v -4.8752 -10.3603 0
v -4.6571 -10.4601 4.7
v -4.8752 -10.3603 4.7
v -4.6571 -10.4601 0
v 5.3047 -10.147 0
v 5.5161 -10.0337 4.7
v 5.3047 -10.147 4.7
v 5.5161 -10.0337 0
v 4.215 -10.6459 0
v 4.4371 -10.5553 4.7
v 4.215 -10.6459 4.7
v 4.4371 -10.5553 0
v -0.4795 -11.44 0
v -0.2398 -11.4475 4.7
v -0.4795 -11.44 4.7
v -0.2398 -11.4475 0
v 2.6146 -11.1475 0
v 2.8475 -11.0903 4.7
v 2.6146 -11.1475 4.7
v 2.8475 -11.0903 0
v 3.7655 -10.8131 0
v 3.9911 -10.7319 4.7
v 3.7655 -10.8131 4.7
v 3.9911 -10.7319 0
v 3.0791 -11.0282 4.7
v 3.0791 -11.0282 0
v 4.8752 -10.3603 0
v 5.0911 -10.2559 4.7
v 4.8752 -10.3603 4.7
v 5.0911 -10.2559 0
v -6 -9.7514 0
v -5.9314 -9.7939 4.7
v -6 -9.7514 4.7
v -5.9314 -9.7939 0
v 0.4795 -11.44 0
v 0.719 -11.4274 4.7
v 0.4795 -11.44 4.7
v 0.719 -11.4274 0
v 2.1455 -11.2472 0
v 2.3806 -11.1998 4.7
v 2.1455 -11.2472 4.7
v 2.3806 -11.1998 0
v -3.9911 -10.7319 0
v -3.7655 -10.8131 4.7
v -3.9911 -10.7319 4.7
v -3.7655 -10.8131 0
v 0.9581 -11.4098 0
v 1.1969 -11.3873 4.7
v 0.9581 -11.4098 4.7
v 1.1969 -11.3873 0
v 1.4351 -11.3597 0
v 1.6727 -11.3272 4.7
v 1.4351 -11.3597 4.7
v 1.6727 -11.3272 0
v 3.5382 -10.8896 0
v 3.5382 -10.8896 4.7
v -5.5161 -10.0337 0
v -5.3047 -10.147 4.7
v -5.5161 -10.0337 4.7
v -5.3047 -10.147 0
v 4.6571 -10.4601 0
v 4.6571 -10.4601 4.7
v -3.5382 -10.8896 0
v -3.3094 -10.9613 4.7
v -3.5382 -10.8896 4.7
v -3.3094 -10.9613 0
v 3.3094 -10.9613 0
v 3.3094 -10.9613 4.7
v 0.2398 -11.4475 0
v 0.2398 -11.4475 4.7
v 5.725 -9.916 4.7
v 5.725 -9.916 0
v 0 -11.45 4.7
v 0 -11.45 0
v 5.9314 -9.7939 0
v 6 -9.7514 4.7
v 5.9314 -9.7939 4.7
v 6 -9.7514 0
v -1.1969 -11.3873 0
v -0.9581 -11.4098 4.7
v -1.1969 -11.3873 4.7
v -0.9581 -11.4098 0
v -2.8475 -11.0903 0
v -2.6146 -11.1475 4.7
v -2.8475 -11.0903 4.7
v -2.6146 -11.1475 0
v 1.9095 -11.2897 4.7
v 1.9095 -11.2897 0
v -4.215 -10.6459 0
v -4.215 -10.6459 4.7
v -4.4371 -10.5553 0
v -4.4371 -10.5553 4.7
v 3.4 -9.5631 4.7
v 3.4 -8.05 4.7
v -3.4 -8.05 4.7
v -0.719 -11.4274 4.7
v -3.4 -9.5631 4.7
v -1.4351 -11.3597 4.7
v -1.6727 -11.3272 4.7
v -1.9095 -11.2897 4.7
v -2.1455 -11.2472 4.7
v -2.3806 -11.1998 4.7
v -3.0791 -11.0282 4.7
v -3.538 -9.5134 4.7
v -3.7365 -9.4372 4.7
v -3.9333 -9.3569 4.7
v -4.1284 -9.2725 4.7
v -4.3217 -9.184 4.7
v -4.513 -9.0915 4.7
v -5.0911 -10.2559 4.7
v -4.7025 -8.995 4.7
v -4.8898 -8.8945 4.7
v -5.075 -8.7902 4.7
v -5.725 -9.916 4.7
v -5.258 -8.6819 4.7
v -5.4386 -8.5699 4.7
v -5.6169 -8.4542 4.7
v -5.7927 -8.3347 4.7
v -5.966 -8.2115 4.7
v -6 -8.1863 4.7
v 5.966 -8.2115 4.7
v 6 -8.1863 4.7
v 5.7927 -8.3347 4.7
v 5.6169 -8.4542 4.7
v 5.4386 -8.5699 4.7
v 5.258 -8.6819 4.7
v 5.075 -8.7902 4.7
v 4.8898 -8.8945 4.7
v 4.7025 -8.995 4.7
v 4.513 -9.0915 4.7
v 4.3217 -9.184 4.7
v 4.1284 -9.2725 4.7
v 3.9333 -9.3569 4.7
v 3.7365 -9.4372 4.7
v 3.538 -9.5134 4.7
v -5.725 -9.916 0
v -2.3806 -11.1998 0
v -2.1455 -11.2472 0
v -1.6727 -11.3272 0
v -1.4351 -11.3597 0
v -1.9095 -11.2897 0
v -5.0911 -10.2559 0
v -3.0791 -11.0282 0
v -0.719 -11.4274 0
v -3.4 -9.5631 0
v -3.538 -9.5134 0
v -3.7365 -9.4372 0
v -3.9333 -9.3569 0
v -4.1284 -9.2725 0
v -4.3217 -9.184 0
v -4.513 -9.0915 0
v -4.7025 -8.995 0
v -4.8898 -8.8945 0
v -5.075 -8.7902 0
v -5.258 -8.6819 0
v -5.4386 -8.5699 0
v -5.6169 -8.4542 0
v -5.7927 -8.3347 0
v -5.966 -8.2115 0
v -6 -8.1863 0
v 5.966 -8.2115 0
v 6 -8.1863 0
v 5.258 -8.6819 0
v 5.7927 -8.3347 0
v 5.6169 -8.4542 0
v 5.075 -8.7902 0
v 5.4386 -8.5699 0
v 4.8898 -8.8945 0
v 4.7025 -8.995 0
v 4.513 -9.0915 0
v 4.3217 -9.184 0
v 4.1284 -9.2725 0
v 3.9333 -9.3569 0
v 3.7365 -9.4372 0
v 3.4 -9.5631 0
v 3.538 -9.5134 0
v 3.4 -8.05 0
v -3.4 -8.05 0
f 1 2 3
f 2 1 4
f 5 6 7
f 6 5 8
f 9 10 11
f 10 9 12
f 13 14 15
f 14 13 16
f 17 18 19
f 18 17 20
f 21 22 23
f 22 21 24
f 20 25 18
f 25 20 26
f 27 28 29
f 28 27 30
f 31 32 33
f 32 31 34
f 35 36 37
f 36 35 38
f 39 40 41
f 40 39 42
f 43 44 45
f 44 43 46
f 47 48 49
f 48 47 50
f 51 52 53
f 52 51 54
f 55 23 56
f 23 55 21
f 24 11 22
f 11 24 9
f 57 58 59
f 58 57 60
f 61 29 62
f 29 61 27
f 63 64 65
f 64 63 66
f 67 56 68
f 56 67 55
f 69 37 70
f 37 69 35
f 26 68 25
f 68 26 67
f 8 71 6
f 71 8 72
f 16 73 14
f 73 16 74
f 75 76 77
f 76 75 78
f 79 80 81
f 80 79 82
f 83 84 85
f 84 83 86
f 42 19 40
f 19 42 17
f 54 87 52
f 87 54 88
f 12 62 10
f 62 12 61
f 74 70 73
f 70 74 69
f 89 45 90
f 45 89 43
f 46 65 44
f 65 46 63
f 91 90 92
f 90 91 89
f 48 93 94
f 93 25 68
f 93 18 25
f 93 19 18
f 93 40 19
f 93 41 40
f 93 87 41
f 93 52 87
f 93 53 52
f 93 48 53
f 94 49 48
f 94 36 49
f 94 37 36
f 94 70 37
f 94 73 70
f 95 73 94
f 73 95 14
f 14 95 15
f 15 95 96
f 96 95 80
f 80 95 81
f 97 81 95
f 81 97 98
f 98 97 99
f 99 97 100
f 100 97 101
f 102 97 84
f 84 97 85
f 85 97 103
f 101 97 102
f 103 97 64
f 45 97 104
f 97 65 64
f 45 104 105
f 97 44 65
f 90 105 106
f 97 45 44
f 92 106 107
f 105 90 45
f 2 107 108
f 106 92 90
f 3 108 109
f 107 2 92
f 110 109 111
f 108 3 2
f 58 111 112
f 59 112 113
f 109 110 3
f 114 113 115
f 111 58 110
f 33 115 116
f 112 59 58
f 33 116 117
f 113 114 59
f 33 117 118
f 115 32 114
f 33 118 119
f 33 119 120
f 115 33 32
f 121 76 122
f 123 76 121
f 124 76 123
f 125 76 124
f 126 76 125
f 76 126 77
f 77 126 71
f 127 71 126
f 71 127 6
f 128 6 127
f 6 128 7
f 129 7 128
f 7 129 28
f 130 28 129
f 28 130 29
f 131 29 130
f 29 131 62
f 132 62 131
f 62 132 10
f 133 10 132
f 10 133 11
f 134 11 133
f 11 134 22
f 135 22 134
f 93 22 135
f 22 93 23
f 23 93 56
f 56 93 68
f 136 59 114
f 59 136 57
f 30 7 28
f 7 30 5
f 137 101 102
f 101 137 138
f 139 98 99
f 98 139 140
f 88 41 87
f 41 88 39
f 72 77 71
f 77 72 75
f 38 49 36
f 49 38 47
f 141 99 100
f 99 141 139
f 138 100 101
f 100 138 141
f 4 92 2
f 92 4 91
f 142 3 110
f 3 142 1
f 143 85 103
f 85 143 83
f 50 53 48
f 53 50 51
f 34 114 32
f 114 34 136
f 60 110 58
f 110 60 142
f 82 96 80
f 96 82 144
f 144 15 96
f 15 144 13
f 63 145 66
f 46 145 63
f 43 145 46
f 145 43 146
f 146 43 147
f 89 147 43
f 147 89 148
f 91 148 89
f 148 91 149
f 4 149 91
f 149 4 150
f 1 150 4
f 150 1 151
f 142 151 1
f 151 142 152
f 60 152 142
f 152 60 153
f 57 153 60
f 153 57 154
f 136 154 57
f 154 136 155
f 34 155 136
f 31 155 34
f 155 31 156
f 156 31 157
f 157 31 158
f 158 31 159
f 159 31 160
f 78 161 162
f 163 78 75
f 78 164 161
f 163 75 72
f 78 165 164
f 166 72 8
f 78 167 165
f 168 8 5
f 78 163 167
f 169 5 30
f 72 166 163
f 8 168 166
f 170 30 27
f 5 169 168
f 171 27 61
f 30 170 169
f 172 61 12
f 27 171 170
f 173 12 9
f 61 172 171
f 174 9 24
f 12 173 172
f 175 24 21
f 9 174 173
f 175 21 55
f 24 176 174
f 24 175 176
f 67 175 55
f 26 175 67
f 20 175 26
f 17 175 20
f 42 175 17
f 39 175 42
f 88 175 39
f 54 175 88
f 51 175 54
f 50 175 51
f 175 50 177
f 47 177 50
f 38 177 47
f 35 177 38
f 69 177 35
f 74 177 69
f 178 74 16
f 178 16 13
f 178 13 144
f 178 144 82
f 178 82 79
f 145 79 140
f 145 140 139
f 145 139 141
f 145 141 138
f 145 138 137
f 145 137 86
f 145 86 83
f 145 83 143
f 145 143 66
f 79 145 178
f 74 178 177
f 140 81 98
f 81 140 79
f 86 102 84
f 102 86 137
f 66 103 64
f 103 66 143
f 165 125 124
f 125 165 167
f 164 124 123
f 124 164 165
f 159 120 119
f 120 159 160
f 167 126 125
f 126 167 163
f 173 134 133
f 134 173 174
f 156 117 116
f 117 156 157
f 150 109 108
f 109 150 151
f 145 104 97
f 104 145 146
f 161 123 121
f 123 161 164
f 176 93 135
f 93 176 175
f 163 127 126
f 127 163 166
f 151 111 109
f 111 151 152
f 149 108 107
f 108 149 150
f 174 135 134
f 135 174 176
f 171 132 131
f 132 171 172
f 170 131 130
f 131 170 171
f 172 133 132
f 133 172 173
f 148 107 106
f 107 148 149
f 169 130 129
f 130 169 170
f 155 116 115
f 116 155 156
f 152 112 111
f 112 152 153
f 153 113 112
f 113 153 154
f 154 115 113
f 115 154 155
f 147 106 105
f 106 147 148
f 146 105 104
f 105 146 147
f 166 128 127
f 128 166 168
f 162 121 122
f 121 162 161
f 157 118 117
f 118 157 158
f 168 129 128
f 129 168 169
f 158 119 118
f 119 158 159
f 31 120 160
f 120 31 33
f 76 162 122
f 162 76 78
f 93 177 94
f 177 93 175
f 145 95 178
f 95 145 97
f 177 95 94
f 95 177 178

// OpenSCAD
// file: candlestick-dimensions.scad
// BSD-3-Clause License
//
// Copyright 2025 Kit Fitzpatrick
//
// Redistribution and use in source and binary forms, with or without modification, are
// permitted provided that the following conditions are met:
//
// 1. Redistributions of source code must retain the above copyright notice, this list of
//    conditions and the following disclaimer.
//
// 2. Redistributions in binary form must reproduce the above copyright notice, this list
//    of conditions and the following disclaimer in the documentation and/or other
//    materials provided with the distribution.
//
// 3. Neither the name of the copyright holder nor the names of its contributors may be
//    used to endorse or promote products derived from this software without specific
//    prior written permission.
//
// THIS SOFTWARE IS PROVIDED BY THE COPYRIGHT HOLDERS AND CONTRIBUTORS “AS IS” AND ANY
// EXPRESS OR IMPLIED WARRANTIES, INCLUDING, BUT NOT LIMITED TO, THE IMPLIED WARRANTIES
// OF MERCHANTABILITY AND FITNESS FOR A PARTICULAR PURPOSE ARE DISCLAIMED. IN NO EVENT
// SHALL THE COPYRIGHT HOLDER OR CONTRIBUTORS BE LIABLE FOR ANY DIRECT, INDIRECT,
// INCIDENTAL, SPECIAL, EXEMPLARY, OR CONSEQUENTIAL DAMAGES (INCLUDING, BUT NOT LIMITED
// TO, PROCUREMENT OF SUBSTITUTE GOODS OR SERVICES; LOSS OF USE, DATA, OR PROFITS; OR
// BUSINESS INTERRUPTION) HOWEVER CAUSED AND ON ANY THEORY OF LIABILITY, WHETHER IN
// CONTRACT, STRICT LIABILITY, OR TORT (INCLUDING NEGLIGENCE OR OTHERWISE) ARISING IN ANY
// WAY OUT OF THE USE OF THIS SOFTWARE, EVEN IF ADVISED OF THE POSSIBILITY OF SUCH DAMAGE.

//
// This is the project file containing the dimensional parameters so they can be shared
// between models.
//
// -- Part of the antique candlestick holder project
//

candle_od = 22.9; // Standard candle size, plus just a bit
candle_height = 120;

// Actually half the thickness for the candle body,
// it's the difference of the diameters. Other use is
// actual thickness
candle_wall_thk = 2.6;

candle_top_relief_dia = candle_od - candle_wall_thk/2;
candle_top_relief_height = 4;
candle_id = candle_od - candle_wall_thk;

cup_bot_dia = 17;
cup_height = 25; // Min about 23.5

cup_id_clearance = 0.1;
cup_top_od = 40;
cup_id = candle_od + cup_id_clearance;
cup_id_depth = 12;
cup_id_taper_depth = 1;
cup_id_taper_dia = cup_id + 1;

cup_grip_id = cup_id;
cup_grip_width = 6;
cup_grip_thk = 1;
cup_grip_relief = cup_grip_thk + 1; // The space behind the grippers

bead_dia = 3;

base_height = 5;

bot_ring_dia = 2;
mid_ring_dia = 12;
top_ring_dia = 3;

bolt_head_thk = 4.5; // 11/64in
bolt_head_dia = 12.5; // 0.484in
bolt_dia = 6.8; // 1/4in
bolt_len = 7;
bolt_total_len = bolt_len + bolt_head_thk;
bolt_head_relief = 15;

socket_dia = 8.4;
socket_height = 13.5;
socket_hole_dia = 5;
socket_holder_height = socket_height + candle_wall_thk;

bulb_od = 16.5; // Actual size 15.75, allow clearance
bulb_base_height = 13;
bulb_thk = 1;
bulb_r1 = 13;
bulb_r2 = 10;
bulb_r3 = 9;
bulb_r4 = 4;
bulb_off1 = 10;
bulb_off2 = 13;
bulb_off3 = 15;
bulb_thread_pitch = 1.5;

wire_slot_height = 12;
wire_slot_width = 2;

flame_height = 40;
flame_base_height = 5;
flame_base_od = 20; // Must be larger than the bulb_od

switch_width = 7.25;
switch_height = 7.25;
switch_depth = 7.25;
switch_stem_width = 4;
switch_stem_height = 4;
switch_back_width = 4.75;
nest_wall_thk = 1;

bottom_thk = 2;

latch_height = 5;
latch_width = 12;
latch_plug_depth = 2.6;
latch_plug_width = 6.8;

usb_thk = 3.75;
usb_width = 9.4;
usb_center = usb_width-usb_thk;
chg_width = 14;
chg_length = 18;

dcdc_width = 11.5;
dcdc_length = 20;
dcdc_thk = 1.5;
dcdc_slot_dia = 5;

dcdc_stop_height = dcdc_length; // Make a stop inside the candle
dcdc_stop_depth = 3.5;

base_air_dia = 1.8;
bulb_air_dia = 2;

// Controls the height of the switch.
// Aritrary space for boards, a minimum of 12.25
switch_board_clearance = 12.25;
switch_slot_depth = cup_id_depth + switch_height + switch_board_clearance - (switch_stem_height/2-0.4);

sw_button_dia = 10;
sw_button_thk = 1;
sw_stem_width = 2;
sw_stem_depth = 3;
sw_stem_height = 1.6;

clip_thk = 0.2;
clip_width = 1.5;
clip_height = sw_stem_height;

base_width = 100;
base_depth = 100;
base_wall_thk = 3.5;
base_to_bot = 12; // From the base ring to the top of the ledge

base_primary_dia = 220;
base_ring_dia = 82; // Eyeball this for a given primary diameter
base_ring_thk = base_wall_thk;
base_corner_cut = 8;
base_pedestal_height = 4;

handle_thk = base_wall_thk;

handle_narrow_width = 10;
handle_wide_width = 20;

handle_rad1 = 20;
handle_ang1 = 90;

handle_rad2 = 10;
handle_ang2 = 180;

handle_height = 25;

handle_rad3 = 20;
handle_ang3 = 30;

handle_overall_height = handle_rad1 + handle_height + handle_rad2 + handle_thk;

handle_base_d = 30;
// main file
// BSD-3-Clause License
//
// Copyright 2025 Kit Fitzpatrick
//
// Redistribution and use in source and binary forms, with or without modification, are
// permitted provided that the following conditions are met:
//
// 1. Redistributions of source code must retain the above copyright notice, this list of
//    conditions and the following disclaimer.
//
// 2. Redistributions in binary form must reproduce the above copyright notice, this list
//    of conditions and the following disclaimer in the documentation and/or other
//    materials provided with the distribution.
//
// 3. Neither the name of the copyright holder nor the names of its contributors may be
//    used to endorse or promote products derived from this software without specific
//    prior written permission.
//
// THIS SOFTWARE IS PROVIDED BY THE COPYRIGHT HOLDERS AND CONTRIBUTORS “AS IS” AND ANY
// EXPRESS OR IMPLIED WARRANTIES, INCLUDING, BUT NOT LIMITED TO, THE IMPLIED WARRANTIES
// OF MERCHANTABILITY AND FITNESS FOR A PARTICULAR PURPOSE ARE DISCLAIMED. IN NO EVENT
// SHALL THE COPYRIGHT HOLDER OR CONTRIBUTORS BE LIABLE FOR ANY DIRECT, INDIRECT,
// INCIDENTAL, SPECIAL, EXEMPLARY, OR CONSEQUENTIAL DAMAGES (INCLUDING, BUT NOT LIMITED
// TO, PROCUREMENT OF SUBSTITUTE GOODS OR SERVICES; LOSS OF USE, DATA, OR PROFITS; OR
// BUSINESS INTERRUPTION) HOWEVER CAUSED AND ON ANY THEORY OF LIABILITY, WHETHER IN
// CONTRACT, STRICT LIABILITY, OR TORT (INCLUDING NEGLIGENCE OR OTHERWISE) ARISING IN ANY
// WAY OUT OF THE USE OF THIS SOFTWARE, EVEN IF ADVISED OF THE POSSIBILITY OF SUCH DAMAGE.

//
// This model is for the latch that locks the charge plate in the candle.
//
// -- Part of the antique candlestick holder project
//

include <candlestick-dimensions.scad>

height_clearance = latch_height - 0.3;
width_clearance = latch_plug_width - 0.1;

difference()
{
   cylinder(h = height_clearance, d = candle_od, $fn=300);

   cylinder(h = height_clearance, d = candle_id, $fn=300);

   translate([-(candle_od/2+latch_width/2), -candle_od/2, 0])
   {
      cube([candle_od/2, candle_od, height_clearance]);
   }

   translate([latch_width/2, -candle_od/2, 0])
   {
      cube([candle_od/2, candle_od, height_clearance]);
   }

   translate([-candle_od/2, 0, 0])
   {
      cube([candle_od, candle_od/2, height_clearance]);
   }
}

// Somewhere between 0.6 and 1.5 are workable
translate([-latch_plug_width/2, -(candle_od/2-0.8), 0])
{
   cube([latch_plug_width, latch_plug_depth, height_clearance]);
}
